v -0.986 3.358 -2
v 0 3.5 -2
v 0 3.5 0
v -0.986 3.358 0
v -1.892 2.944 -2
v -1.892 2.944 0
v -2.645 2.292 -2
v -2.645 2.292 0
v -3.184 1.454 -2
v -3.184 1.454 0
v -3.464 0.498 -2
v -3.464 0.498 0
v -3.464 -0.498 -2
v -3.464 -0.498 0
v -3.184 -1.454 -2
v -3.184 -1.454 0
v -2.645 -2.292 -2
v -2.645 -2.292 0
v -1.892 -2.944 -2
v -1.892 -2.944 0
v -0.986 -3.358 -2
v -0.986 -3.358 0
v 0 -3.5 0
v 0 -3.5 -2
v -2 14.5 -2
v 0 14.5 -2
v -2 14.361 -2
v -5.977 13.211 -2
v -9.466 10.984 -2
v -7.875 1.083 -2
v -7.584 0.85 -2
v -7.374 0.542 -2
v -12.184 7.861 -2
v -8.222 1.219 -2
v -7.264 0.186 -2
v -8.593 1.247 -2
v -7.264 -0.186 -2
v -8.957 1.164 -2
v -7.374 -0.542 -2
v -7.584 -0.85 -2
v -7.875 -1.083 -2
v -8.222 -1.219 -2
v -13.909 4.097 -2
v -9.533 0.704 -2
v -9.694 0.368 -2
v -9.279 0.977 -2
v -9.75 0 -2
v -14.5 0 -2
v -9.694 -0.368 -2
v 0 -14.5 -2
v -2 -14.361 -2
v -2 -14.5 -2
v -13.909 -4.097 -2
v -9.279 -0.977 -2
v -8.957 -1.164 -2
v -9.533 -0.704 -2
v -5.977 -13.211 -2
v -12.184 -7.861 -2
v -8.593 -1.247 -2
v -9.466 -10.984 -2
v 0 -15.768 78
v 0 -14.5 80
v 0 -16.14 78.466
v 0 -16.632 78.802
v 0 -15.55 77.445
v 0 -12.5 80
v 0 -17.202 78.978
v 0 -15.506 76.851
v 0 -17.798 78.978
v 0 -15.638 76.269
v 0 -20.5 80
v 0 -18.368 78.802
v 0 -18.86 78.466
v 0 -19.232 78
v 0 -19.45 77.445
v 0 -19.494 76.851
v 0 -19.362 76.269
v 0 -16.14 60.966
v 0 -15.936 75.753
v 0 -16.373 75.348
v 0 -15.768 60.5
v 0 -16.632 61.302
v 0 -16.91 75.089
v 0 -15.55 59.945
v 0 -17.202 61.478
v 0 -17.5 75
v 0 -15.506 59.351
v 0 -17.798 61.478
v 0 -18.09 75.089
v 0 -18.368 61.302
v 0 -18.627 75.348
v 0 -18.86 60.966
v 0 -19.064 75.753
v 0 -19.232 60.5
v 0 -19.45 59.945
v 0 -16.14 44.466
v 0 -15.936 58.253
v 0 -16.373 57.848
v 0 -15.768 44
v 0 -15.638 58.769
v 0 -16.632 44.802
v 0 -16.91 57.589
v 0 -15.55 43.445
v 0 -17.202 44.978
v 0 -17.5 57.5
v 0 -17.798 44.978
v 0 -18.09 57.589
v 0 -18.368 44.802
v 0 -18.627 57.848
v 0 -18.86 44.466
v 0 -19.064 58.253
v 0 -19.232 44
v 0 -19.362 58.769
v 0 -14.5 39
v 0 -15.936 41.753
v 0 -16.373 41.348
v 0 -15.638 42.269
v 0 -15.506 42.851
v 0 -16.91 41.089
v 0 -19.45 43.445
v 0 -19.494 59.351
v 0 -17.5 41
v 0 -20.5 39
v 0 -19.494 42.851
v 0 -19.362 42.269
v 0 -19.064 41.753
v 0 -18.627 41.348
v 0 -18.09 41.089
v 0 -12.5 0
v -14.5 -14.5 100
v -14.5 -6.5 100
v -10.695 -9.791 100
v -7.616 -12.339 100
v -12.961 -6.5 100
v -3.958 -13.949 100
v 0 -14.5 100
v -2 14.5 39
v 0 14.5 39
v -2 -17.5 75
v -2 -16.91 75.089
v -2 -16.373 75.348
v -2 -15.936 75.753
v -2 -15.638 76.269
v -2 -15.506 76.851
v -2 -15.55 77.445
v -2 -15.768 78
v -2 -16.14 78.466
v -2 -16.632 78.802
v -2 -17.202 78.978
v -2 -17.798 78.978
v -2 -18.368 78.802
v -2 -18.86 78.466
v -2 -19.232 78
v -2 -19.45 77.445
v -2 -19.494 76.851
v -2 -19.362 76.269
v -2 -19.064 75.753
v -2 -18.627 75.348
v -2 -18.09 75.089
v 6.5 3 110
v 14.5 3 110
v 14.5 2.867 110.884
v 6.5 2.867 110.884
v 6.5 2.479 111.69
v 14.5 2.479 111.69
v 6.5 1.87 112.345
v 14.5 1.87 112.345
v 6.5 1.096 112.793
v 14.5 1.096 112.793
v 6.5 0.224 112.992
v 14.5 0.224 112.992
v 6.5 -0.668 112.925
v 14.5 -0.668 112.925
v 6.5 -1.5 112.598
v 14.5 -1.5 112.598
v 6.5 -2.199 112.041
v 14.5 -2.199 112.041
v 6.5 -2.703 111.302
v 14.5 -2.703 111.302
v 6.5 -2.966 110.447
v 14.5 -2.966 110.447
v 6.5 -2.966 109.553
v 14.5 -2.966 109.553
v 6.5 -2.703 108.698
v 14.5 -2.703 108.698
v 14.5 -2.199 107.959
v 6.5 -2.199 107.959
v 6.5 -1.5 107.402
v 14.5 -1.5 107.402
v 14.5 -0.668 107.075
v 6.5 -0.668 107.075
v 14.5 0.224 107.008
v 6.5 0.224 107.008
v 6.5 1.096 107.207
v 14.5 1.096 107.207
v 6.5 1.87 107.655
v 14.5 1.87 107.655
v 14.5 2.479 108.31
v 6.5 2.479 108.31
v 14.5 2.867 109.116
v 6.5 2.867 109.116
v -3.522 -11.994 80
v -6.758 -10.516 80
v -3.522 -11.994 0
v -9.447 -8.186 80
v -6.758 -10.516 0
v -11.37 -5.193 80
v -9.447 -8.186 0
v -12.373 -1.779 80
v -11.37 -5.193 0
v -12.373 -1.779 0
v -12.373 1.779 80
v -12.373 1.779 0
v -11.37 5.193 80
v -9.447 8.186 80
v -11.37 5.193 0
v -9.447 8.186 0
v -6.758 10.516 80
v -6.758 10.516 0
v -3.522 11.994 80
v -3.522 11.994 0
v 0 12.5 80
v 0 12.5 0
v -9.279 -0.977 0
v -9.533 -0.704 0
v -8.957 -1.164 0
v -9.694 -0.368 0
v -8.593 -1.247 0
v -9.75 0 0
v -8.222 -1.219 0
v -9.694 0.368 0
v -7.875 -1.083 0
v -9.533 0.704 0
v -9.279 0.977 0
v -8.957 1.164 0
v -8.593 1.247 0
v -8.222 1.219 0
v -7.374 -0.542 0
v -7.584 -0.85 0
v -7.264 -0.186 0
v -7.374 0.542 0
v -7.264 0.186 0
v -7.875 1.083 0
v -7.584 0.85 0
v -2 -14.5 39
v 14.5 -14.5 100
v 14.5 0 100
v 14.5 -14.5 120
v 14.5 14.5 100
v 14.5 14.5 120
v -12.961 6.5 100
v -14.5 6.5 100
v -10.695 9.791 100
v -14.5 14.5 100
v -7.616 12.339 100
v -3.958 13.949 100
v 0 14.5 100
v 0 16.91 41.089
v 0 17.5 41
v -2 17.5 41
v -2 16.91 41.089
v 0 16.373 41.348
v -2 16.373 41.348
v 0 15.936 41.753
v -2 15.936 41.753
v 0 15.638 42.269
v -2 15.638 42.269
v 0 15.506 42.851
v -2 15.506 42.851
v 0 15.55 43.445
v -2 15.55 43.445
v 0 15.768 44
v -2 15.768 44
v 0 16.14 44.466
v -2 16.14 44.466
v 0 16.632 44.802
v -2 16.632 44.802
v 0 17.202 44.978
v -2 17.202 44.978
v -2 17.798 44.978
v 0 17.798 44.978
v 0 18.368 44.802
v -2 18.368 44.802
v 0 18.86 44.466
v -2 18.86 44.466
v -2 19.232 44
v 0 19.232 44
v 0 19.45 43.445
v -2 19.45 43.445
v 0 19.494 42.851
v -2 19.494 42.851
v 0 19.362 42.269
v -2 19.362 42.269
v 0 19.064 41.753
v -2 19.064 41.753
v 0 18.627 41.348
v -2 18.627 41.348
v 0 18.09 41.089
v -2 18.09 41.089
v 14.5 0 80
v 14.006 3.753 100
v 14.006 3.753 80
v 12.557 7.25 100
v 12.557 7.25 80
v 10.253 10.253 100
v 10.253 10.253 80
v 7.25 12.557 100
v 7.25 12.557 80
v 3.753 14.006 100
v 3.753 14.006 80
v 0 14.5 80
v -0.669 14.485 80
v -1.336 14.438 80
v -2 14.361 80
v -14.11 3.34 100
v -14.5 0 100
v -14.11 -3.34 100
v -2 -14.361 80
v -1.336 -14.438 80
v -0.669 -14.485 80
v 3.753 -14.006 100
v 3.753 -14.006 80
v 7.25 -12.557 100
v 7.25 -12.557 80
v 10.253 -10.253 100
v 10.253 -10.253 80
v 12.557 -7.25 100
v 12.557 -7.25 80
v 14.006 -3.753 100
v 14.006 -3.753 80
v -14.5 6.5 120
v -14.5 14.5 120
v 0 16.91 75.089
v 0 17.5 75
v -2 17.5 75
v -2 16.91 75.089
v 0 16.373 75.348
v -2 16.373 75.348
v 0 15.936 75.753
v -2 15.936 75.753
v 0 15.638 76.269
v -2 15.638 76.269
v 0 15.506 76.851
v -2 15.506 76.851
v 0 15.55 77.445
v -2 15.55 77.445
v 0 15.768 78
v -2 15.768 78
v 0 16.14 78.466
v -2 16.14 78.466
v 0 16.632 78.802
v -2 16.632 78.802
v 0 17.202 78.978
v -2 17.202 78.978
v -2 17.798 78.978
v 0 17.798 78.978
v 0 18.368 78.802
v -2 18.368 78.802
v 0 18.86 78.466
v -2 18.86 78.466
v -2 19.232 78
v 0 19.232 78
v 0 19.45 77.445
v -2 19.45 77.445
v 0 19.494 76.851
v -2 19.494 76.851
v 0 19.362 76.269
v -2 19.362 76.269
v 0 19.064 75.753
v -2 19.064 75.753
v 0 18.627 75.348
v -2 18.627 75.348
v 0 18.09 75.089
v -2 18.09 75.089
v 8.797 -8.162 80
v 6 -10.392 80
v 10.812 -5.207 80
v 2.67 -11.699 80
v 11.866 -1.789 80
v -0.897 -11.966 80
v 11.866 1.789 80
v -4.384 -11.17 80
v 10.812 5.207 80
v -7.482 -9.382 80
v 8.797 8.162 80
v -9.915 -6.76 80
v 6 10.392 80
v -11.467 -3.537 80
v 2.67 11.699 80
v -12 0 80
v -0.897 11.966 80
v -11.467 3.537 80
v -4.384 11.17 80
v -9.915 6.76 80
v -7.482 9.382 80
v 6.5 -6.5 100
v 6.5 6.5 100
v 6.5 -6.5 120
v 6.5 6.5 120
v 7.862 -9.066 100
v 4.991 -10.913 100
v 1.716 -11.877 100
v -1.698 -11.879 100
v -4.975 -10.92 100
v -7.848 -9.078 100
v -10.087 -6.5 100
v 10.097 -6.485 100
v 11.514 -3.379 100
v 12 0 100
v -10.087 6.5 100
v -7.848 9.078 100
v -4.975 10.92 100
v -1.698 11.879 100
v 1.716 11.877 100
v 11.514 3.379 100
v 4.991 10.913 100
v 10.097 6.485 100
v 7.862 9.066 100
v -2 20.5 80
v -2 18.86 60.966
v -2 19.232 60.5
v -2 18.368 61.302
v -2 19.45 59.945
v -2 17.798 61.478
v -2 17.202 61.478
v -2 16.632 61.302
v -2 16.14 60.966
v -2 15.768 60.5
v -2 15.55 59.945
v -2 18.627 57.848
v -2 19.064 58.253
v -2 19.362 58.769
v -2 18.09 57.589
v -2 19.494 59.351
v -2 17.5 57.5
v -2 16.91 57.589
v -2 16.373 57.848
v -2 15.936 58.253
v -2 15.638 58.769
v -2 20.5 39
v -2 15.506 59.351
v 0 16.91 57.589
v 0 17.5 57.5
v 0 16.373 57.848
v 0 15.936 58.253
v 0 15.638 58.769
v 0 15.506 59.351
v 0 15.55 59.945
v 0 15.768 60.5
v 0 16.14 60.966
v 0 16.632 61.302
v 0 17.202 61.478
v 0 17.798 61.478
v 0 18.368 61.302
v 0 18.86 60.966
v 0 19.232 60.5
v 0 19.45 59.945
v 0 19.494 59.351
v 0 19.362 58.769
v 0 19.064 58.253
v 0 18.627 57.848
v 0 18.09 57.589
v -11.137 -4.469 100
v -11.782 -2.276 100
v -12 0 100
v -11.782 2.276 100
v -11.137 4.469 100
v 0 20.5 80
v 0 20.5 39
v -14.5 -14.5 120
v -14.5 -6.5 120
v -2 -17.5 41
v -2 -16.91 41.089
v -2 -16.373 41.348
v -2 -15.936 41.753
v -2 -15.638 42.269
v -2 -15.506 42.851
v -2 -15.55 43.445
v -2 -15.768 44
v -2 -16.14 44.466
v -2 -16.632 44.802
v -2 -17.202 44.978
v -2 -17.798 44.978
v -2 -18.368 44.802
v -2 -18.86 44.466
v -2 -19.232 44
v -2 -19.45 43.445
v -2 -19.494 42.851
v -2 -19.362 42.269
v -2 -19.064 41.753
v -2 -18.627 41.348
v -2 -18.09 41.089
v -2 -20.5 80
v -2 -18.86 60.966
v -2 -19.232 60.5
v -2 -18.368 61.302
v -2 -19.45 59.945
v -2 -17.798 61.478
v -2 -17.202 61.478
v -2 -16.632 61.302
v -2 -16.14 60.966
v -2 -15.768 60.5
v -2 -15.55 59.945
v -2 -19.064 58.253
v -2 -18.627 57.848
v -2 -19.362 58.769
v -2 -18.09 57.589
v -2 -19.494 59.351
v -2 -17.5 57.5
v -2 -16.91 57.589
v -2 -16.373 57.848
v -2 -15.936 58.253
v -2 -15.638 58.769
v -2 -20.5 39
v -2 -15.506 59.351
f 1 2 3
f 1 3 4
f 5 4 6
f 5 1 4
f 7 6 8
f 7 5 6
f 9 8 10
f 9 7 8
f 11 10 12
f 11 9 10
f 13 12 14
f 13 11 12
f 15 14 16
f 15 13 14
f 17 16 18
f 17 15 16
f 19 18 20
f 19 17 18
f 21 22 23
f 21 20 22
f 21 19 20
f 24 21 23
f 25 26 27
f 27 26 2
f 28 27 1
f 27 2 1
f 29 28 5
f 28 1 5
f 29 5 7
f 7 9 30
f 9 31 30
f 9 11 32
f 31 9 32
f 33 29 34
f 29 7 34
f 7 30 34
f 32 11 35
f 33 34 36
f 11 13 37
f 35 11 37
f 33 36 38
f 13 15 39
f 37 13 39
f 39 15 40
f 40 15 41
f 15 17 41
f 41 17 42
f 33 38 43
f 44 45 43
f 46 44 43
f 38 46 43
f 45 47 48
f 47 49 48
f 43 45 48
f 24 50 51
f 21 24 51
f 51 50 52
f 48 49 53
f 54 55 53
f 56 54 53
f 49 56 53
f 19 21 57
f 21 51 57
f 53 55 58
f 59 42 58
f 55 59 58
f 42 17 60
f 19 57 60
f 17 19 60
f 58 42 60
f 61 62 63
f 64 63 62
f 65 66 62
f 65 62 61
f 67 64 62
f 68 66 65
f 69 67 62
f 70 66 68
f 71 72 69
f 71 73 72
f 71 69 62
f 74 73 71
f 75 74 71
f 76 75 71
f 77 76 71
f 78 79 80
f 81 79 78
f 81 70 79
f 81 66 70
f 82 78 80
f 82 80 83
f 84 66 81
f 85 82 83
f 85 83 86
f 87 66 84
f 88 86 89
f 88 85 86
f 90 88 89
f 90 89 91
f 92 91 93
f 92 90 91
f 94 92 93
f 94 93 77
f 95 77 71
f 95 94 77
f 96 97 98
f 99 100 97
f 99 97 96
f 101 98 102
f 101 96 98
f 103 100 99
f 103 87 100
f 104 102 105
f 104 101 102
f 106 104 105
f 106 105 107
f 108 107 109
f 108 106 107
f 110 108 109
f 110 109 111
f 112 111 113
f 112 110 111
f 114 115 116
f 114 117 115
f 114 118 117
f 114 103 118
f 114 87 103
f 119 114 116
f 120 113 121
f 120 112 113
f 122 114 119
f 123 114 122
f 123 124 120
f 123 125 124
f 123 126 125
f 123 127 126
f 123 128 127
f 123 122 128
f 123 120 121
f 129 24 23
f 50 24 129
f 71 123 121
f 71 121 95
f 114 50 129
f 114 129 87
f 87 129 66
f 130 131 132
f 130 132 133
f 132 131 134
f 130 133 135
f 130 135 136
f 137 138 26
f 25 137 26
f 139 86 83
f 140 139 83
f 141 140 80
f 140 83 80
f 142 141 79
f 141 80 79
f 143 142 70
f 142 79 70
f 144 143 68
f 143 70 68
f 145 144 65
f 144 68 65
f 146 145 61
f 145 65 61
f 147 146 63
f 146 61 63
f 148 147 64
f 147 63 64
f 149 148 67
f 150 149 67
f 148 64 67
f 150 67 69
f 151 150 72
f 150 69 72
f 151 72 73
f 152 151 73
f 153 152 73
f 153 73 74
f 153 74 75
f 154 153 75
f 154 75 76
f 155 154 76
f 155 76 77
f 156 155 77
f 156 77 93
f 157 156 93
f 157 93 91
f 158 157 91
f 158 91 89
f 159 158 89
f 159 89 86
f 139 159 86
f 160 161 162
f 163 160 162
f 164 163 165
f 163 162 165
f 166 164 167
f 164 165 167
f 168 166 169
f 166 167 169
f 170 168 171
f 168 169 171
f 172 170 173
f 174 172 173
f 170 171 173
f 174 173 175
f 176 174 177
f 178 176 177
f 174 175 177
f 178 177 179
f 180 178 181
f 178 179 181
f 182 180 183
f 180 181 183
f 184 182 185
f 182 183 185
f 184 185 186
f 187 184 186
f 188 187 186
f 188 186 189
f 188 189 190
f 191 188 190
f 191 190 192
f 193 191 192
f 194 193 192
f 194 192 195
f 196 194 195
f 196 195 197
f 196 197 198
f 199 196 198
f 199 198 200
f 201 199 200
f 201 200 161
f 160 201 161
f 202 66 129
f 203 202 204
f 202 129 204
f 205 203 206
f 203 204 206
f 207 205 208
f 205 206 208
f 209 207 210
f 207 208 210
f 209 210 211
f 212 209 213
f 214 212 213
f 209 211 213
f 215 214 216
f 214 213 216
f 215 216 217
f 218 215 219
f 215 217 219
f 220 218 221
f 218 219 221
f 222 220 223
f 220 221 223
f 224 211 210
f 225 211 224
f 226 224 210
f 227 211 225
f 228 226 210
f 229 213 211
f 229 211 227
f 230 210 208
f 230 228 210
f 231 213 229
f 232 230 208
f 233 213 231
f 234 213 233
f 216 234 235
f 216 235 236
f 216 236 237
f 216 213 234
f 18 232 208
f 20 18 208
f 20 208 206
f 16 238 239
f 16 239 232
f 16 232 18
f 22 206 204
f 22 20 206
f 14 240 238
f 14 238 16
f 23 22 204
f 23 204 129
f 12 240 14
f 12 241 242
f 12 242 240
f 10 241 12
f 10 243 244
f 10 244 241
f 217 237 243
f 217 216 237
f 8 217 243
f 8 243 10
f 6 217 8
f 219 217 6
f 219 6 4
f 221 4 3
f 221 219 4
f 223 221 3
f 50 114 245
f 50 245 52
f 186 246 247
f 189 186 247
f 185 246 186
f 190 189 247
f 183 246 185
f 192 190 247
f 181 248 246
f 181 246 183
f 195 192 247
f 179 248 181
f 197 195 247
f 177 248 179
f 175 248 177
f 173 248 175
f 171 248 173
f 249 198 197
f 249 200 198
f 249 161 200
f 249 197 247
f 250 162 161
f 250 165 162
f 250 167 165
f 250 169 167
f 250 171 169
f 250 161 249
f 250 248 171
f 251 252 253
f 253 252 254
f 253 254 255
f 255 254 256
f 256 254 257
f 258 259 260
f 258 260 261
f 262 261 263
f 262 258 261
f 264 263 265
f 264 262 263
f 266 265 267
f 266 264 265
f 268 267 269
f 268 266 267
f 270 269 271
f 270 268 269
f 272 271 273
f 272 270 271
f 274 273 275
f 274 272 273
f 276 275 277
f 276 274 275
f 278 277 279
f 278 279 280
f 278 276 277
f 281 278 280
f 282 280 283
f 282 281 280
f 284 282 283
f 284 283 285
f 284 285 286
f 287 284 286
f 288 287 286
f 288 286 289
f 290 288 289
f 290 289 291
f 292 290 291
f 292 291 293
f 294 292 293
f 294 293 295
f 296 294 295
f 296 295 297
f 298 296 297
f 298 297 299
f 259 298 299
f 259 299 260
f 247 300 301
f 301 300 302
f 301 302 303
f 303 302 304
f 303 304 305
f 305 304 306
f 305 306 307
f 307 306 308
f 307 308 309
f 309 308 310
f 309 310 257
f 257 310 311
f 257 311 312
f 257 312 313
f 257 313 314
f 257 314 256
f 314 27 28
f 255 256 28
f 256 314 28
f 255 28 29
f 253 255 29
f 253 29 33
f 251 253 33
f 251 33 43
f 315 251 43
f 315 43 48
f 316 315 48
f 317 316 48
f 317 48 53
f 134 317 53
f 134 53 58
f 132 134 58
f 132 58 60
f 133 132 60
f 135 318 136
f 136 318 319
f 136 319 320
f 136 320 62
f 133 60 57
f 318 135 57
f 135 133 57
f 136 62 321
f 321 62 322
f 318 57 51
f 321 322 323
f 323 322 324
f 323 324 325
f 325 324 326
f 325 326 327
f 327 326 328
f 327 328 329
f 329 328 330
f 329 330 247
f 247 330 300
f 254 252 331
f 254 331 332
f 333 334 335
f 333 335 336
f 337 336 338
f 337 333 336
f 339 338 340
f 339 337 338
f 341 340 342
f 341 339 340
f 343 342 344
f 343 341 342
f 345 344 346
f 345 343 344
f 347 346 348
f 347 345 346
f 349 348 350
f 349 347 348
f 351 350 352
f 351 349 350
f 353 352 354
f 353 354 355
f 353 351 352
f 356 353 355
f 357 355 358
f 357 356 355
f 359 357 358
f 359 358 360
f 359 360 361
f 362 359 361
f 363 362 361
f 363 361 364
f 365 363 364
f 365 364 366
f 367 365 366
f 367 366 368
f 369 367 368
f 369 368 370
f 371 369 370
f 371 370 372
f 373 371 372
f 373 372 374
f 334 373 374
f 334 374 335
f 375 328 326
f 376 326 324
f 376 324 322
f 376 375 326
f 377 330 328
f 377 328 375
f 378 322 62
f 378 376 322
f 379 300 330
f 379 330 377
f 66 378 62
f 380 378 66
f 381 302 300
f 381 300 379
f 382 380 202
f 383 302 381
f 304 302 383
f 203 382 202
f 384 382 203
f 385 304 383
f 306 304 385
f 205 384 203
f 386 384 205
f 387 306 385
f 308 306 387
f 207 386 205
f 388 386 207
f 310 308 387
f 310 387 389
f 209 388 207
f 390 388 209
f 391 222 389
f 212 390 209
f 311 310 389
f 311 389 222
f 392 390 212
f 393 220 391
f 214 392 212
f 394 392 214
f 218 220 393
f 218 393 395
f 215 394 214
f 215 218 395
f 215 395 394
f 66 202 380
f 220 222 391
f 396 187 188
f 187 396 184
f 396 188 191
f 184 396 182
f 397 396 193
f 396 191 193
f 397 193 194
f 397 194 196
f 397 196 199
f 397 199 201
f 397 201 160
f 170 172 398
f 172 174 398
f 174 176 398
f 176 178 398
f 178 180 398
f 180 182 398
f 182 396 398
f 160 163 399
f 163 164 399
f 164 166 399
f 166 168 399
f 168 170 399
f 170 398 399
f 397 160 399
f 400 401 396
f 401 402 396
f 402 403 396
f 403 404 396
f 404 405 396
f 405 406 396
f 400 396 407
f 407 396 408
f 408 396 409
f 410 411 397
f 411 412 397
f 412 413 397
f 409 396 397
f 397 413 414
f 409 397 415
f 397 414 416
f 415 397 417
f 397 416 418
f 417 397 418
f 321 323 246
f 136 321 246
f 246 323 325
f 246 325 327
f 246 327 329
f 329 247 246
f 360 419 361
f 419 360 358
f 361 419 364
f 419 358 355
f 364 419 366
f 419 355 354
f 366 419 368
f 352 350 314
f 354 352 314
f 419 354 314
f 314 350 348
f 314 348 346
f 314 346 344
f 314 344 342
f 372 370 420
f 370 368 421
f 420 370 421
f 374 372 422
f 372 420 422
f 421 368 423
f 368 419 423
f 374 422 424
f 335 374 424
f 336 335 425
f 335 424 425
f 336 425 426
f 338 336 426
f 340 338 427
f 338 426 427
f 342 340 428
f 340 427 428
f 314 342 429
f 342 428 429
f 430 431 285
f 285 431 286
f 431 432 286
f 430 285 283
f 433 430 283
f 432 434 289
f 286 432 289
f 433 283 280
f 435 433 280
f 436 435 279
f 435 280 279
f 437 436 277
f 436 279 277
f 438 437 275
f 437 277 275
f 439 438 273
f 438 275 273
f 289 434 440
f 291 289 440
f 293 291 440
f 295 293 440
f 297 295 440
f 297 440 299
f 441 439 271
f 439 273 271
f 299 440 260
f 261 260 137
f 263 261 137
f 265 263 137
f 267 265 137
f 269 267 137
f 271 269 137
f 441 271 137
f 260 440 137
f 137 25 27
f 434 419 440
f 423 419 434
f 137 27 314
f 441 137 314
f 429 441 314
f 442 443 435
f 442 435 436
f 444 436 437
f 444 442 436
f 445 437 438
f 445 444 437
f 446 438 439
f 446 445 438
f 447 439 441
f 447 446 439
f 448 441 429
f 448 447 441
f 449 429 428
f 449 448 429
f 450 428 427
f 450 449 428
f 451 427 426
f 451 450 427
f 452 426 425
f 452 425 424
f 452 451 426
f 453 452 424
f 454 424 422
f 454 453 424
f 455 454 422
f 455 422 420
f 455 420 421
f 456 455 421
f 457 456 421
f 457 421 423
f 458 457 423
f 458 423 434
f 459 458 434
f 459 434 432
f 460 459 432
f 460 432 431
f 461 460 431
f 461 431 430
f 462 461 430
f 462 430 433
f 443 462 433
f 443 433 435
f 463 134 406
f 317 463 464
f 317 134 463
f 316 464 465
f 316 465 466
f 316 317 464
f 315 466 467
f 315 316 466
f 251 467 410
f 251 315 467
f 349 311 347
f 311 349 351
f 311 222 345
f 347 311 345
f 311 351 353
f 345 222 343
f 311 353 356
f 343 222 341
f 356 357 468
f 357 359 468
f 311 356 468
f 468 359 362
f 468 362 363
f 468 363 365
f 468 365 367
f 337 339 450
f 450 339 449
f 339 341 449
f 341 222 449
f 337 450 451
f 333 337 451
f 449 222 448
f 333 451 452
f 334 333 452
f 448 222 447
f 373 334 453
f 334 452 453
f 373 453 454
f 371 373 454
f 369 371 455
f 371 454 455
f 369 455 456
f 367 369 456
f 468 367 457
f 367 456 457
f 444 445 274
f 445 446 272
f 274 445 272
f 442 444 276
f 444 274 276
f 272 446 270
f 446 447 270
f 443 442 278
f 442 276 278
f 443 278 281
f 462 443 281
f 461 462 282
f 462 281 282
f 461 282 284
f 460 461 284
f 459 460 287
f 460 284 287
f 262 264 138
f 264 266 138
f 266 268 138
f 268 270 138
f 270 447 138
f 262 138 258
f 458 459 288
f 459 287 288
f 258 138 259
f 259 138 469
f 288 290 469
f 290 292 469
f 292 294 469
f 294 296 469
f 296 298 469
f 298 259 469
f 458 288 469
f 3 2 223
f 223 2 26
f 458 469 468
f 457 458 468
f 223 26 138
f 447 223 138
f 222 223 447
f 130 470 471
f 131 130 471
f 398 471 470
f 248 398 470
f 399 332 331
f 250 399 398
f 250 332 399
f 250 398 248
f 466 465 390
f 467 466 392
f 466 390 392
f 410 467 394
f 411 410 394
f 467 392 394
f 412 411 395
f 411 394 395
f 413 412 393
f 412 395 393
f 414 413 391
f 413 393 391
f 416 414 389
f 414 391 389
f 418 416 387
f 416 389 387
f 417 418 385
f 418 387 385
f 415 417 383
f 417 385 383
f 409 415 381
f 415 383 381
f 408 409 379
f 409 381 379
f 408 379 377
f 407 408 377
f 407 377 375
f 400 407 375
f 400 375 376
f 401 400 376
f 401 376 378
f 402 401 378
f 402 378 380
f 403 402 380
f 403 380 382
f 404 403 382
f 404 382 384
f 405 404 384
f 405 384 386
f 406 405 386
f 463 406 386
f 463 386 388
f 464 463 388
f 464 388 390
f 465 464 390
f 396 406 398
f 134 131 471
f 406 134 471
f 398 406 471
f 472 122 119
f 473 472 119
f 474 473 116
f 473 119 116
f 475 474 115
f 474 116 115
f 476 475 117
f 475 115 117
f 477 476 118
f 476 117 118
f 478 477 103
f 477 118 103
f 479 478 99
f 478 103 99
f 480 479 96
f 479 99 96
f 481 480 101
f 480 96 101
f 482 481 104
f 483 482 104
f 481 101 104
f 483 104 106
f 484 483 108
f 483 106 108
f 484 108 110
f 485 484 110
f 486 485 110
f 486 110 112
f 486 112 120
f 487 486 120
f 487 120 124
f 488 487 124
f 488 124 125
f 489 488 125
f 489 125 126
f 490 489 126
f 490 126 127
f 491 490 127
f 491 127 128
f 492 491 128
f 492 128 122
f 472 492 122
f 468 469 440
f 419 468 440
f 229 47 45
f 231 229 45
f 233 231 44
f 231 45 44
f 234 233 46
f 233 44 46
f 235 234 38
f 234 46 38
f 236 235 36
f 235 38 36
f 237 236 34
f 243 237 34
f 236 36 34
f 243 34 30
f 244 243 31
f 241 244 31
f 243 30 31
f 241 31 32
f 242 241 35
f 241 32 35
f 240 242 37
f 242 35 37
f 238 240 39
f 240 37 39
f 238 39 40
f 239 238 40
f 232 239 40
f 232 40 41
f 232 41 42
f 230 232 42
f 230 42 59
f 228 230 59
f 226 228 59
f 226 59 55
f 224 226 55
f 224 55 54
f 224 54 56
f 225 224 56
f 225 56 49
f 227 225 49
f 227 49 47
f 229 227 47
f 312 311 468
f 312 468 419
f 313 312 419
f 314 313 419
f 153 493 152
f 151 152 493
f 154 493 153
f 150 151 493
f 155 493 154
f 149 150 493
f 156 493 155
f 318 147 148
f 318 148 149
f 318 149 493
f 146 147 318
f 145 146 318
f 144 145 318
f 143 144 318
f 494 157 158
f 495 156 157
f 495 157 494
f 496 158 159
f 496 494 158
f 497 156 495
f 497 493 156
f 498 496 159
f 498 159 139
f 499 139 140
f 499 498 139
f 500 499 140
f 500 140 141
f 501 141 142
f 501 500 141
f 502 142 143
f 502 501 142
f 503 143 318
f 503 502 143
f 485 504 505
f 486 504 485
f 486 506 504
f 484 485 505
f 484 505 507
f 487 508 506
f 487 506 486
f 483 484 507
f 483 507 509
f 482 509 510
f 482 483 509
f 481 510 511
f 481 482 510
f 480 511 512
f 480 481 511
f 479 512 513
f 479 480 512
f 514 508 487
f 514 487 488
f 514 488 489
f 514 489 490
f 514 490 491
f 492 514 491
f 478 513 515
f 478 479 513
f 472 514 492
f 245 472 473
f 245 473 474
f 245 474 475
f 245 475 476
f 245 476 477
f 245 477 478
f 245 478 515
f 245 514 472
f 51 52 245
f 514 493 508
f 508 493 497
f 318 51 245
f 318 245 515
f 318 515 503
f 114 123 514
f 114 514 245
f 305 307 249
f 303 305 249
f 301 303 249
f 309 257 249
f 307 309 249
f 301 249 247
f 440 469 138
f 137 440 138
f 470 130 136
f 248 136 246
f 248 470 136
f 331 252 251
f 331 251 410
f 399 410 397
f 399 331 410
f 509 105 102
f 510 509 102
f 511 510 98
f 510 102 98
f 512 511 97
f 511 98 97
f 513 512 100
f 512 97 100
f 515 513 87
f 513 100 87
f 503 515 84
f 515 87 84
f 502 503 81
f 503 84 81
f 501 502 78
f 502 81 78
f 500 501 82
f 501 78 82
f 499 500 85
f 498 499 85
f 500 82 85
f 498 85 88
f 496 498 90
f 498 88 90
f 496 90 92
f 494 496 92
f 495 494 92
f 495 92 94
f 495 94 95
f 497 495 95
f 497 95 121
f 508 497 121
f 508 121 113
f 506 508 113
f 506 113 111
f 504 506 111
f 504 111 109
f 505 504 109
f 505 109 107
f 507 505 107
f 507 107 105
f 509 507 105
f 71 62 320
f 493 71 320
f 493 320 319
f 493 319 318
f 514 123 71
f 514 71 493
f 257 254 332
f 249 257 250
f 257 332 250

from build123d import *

# Parameters (mm, degrees)
SKETCH1_R           = 14.5
BOSS_EXTRUDE1_DEPTH = 120
CUT_EXTRUDE1_REACH  = 123.739
SKETCH2_R           = 12
SKETCH3_R           = 12.5
CUT_EXTRUDE2_DEPTH  = 80
CUT_EXTRUDE3_DEPTH  = 80
BOSS_EXTRUDE2_START = 2
BOSS_EXTRUDE2_DEPTH = 2
CUT_EXTRUDE4_REACH  = 125.711
CUT_EXTRUDE5_REACH  = 125.711
SKETCH7_R           = 1.25
BOSS_EXTRUDE3_DEPTH = 82
CUT_EXTRUDE6_REACH  = 124.599
SKETCH9_W           = 41
SKETCH9_H           = 6
CUT_EXTRUDE7_REACH  = 124.599
SKETCH10_R          = 2
SKETCH12_W          = 29
SKETCH12_H          = 29
BOSS_EXTRUDE4_DEPTH = 20
CUT_EXTRUDE9_REACH  = 126.557
SKETCH13_W          = 13
SKETCH13_H          = 13
CUT_EXTRUDE10_REACH = 127.145
SKETCH14_W          = 20
SKETCH14_H          = 13
CUT_EXTRUDE11_REACH = 127.145
SKETCH15_R          = 3


with BuildPart() as part:
    # Sketch1 → Boss-Extrude1 (new body)
    with BuildSketch(Plane.XY):
        Circle(SKETCH1_R)
    extrude(amount=BOSS_EXTRUDE1_DEPTH)

    # Sketch2 → Cut-Extrude1 (cut, up to next)
    with BuildSketch(Plane(origin=(0, 0, 0), x_dir=(-1, 0, 0), z_dir=(0, 0, -1)), mode=Mode.PRIVATE) as cut_extrude1_sk1:
        Circle(SKETCH2_R)
    cut_extrude1_tool1 = extrude(cut_extrude1_sk1.sketch, amount=-CUT_EXTRUDE1_REACH, mode=Mode.PRIVATE) & part.part
    add(cut_extrude1_tool1.solids().sort_by_distance((0, 0, 0))[0], mode=Mode.SUBTRACT)

    # Sketch3 → Cut-Extrude2 (cut)
    with BuildSketch(Plane(origin=(0, 0, 0), x_dir=(-1, 0, 0), z_dir=(0, 0, -1))):
        Circle(SKETCH3_R)
    extrude(amount=-CUT_EXTRUDE2_DEPTH, mode=Mode.SUBTRACT)

    # Sketch4 → Cut-Extrude3 (cut)
    with BuildSketch(Plane(origin=(0, 0, 0), x_dir=(-1, 0, 0), z_dir=(0, 0, -1))):
        with BuildLine():
            Line((0, -14.5), (0, 14.5))
            ThreePointArc((0, 14.5), (-14.5, 0), (0, -14.5))
        make_face()
    extrude(amount=-CUT_EXTRUDE3_DEPTH, mode=Mode.SUBTRACT)

    # Sketch5 → Boss-Extrude2 (add)
    with BuildSketch(Plane(origin=(0, 0, 0), x_dir=(-1, 0, 0), z_dir=(0, 0, -1)).offset(BOSS_EXTRUDE2_START)):
        with BuildLine():
            Line((0, -14.5), (0, 14.5))
            ThreePointArc((0, 14.5), (14.5, 0), (0, -14.5))
        make_face()
    extrude(amount=-BOSS_EXTRUDE2_DEPTH)

    # Sketch6 → Cut-Extrude4 (cut, up to next)
    with BuildSketch(Plane(origin=(0, 0, -2), x_dir=(-1, 0, 0), z_dir=(0, 0, -1)), mode=Mode.PRIVATE) as cut_extrude4_sk1:
        with BuildLine():
            Line((0, -3.5), (0, 3.5))
            ThreePointArc((0, 3.5), (3.5, 0), (0, -3.5))
        make_face()
    cut_extrude4_tool1 = extrude(cut_extrude4_sk1.sketch, amount=-CUT_EXTRUDE4_REACH, mode=Mode.PRIVATE) & part.part
    add(cut_extrude4_tool1.solids().sort_by_distance((-1.485446, 0, -2))[0], mode=Mode.SUBTRACT)

    # Sketch7 → Cut-Extrude5 (cut, up to next)
    with BuildSketch(Plane(origin=(0, 0, -2), x_dir=(-1, 0, 0), z_dir=(0, 0, -1)), mode=Mode.PRIVATE) as cut_extrude5_sk1:
        with Locations((8.5, 0)):
            Circle(SKETCH7_R)
    cut_extrude5_tool1 = extrude(cut_extrude5_sk1.sketch, amount=-CUT_EXTRUDE5_REACH, mode=Mode.PRIVATE) & part.part
    add(cut_extrude5_tool1.solids().sort_by_distance((-8.5, 0, -2))[0], mode=Mode.SUBTRACT)

    # Sketch8 → Boss-Extrude3 (add)
    with BuildSketch(Plane(origin=(0, 0, -2), x_dir=(-1, 0, 0), z_dir=(0, 0, -1))):
        with BuildLine():
            Line((0, -14.5), (0, -20.5))
            Line((0, -20.5), (2, -20.5))
            Line((2, -20.5), (2, -14.361406616))
            ThreePointArc((2, -14.361406616), (1.00239814, -14.465310158), (0, -14.5))
        make_face()
    boss_extrude3 = extrude(amount=-BOSS_EXTRUDE3_DEPTH)

    # Sketch9 → Cut-Extrude6 (cut, up to next)
    with BuildSketch(Plane(origin=(0, 0, 0), x_dir=(0, 0, -1), z_dir=(1, 0, 0)), mode=Mode.PRIVATE) as cut_extrude6_sk1:
        with Locations((-18.5, -17.5)):
            Rectangle(SKETCH9_W, SKETCH9_H)
    cut_extrude6_tool1 = extrude(cut_extrude6_sk1.sketch, amount=-CUT_EXTRUDE6_REACH, mode=Mode.PRIVATE) & part.part
    cut_extrude6 = cut_extrude6_tool1.solids().sort_by_distance((0, -17.5, 18.5))[0]
    add(cut_extrude6, mode=Mode.SUBTRACT)

    # Sketch10 → Cut-Extrude7 (cut, up to next)
    with BuildSketch(Plane(origin=(0, 0, 0), x_dir=(0, 0, -1), z_dir=(1, 0, 0)), mode=Mode.PRIVATE) as cut_extrude7_sk1:
        with Locations((-77, -17.5)):
            Circle(SKETCH10_R)
    cut_extrude7_tool1 = extrude(cut_extrude7_sk1.sketch, amount=-CUT_EXTRUDE7_REACH, mode=Mode.PRIVATE) & part.part
    # Sketch10 → Cut-Extrude7 (cut, up to next)
    with BuildSketch(Plane(origin=(0, 0, 0), x_dir=(0, 0, -1), z_dir=(1, 0, 0)), mode=Mode.PRIVATE) as cut_extrude7_sk2:
        with Locations((-59.5, -17.5)):
            Circle(SKETCH10_R)
    cut_extrude7_tool2 = extrude(cut_extrude7_sk2.sketch, amount=-CUT_EXTRUDE7_REACH, mode=Mode.PRIVATE) & part.part
    # Sketch10 → Cut-Extrude7 (cut, up to next)
    with BuildSketch(Plane(origin=(0, 0, 0), x_dir=(0, 0, -1), z_dir=(1, 0, 0)), mode=Mode.PRIVATE) as cut_extrude7_sk3:
        with Locations((-43, -17.5)):
            Circle(SKETCH10_R)
    cut_extrude7_tool3 = extrude(cut_extrude7_sk3.sketch, amount=-CUT_EXTRUDE7_REACH, mode=Mode.PRIVATE) & part.part
    cut_extrude7_1 = cut_extrude7_tool1.solids().sort_by_distance((0, -17.5, 77))[0]
    add(cut_extrude7_1, mode=Mode.SUBTRACT)
    cut_extrude7_2 = cut_extrude7_tool2.solids().sort_by_distance((0, -17.5, 59.5))[0]
    add(cut_extrude7_2, mode=Mode.SUBTRACT)
    cut_extrude7_3 = cut_extrude7_tool3.solids().sort_by_distance((0, -17.5, 43))[0]
    add(cut_extrude7_3, mode=Mode.SUBTRACT)
    cut_extrude7 = cut_extrude7_1 + cut_extrude7_2 + cut_extrude7_3  # Cut-Extrude7 as one shape, for the pattern or mirror that repeats it

    # Mirror1: Boss-Extrude3, Cut-Extrude6, Cut-Extrude7 across plane
    add(boss_extrude3.mirror(Plane.ZX))
    add(cut_extrude6.mirror(Plane.ZX), mode=Mode.SUBTRACT)
    add(cut_extrude7.mirror(Plane.ZX), mode=Mode.SUBTRACT)

    # Sketch12 → Boss-Extrude4 (add)
    with BuildSketch(Plane.XY.offset(120)):
        Rectangle(SKETCH12_W, SKETCH12_H)
    extrude(amount=-BOSS_EXTRUDE4_DEPTH)

    # Sketch13 → Cut-Extrude9 (cut, up to next)
    with BuildSketch(Plane.XY.offset(120), mode=Mode.PRIVATE) as cut_extrude9_sk1:
        Rectangle(SKETCH13_W, SKETCH13_H)
    cut_extrude9_tool1 = extrude(cut_extrude9_sk1.sketch, amount=-CUT_EXTRUDE9_REACH, mode=Mode.PRIVATE) & part.part
    add(cut_extrude9_tool1.solids().sort_by_distance((0, 0, 120))[0], mode=Mode.SUBTRACT)

    # Sketch14 → Cut-Extrude10 (cut, up to next)
    with BuildSketch(Plane.ZY.offset(14.5), mode=Mode.PRIVATE) as cut_extrude10_sk1:
        with Locations((110, 0)):
            Rectangle(SKETCH14_W, SKETCH14_H)
    cut_extrude10_tool1 = extrude(cut_extrude10_sk1.sketch, amount=-CUT_EXTRUDE10_REACH, mode=Mode.PRIVATE) & part.part
    add(cut_extrude10_tool1.solids().sort_by_distance((-14.5, 0, 110))[0], mode=Mode.SUBTRACT)

    # Sketch15 → Cut-Extrude11 (cut, up to next)
    with BuildSketch(Plane(origin=(14.5, 0, 0), x_dir=(0, 0, -1), z_dir=(1, 0, 0)), mode=Mode.PRIVATE) as cut_extrude11_sk1:
        with Locations(Location((-110, 0, 0), (0, 0, 90))):
            Circle(SKETCH15_R)
    cut_extrude11_tool1 = extrude(cut_extrude11_sk1.sketch, amount=-CUT_EXTRUDE11_REACH, mode=Mode.PRIVATE) & part.part
    add(cut_extrude11_tool1.solids().sort_by_distance((14.5, 0, 110))[0], mode=Mode.SUBTRACT)


solid = part.part
